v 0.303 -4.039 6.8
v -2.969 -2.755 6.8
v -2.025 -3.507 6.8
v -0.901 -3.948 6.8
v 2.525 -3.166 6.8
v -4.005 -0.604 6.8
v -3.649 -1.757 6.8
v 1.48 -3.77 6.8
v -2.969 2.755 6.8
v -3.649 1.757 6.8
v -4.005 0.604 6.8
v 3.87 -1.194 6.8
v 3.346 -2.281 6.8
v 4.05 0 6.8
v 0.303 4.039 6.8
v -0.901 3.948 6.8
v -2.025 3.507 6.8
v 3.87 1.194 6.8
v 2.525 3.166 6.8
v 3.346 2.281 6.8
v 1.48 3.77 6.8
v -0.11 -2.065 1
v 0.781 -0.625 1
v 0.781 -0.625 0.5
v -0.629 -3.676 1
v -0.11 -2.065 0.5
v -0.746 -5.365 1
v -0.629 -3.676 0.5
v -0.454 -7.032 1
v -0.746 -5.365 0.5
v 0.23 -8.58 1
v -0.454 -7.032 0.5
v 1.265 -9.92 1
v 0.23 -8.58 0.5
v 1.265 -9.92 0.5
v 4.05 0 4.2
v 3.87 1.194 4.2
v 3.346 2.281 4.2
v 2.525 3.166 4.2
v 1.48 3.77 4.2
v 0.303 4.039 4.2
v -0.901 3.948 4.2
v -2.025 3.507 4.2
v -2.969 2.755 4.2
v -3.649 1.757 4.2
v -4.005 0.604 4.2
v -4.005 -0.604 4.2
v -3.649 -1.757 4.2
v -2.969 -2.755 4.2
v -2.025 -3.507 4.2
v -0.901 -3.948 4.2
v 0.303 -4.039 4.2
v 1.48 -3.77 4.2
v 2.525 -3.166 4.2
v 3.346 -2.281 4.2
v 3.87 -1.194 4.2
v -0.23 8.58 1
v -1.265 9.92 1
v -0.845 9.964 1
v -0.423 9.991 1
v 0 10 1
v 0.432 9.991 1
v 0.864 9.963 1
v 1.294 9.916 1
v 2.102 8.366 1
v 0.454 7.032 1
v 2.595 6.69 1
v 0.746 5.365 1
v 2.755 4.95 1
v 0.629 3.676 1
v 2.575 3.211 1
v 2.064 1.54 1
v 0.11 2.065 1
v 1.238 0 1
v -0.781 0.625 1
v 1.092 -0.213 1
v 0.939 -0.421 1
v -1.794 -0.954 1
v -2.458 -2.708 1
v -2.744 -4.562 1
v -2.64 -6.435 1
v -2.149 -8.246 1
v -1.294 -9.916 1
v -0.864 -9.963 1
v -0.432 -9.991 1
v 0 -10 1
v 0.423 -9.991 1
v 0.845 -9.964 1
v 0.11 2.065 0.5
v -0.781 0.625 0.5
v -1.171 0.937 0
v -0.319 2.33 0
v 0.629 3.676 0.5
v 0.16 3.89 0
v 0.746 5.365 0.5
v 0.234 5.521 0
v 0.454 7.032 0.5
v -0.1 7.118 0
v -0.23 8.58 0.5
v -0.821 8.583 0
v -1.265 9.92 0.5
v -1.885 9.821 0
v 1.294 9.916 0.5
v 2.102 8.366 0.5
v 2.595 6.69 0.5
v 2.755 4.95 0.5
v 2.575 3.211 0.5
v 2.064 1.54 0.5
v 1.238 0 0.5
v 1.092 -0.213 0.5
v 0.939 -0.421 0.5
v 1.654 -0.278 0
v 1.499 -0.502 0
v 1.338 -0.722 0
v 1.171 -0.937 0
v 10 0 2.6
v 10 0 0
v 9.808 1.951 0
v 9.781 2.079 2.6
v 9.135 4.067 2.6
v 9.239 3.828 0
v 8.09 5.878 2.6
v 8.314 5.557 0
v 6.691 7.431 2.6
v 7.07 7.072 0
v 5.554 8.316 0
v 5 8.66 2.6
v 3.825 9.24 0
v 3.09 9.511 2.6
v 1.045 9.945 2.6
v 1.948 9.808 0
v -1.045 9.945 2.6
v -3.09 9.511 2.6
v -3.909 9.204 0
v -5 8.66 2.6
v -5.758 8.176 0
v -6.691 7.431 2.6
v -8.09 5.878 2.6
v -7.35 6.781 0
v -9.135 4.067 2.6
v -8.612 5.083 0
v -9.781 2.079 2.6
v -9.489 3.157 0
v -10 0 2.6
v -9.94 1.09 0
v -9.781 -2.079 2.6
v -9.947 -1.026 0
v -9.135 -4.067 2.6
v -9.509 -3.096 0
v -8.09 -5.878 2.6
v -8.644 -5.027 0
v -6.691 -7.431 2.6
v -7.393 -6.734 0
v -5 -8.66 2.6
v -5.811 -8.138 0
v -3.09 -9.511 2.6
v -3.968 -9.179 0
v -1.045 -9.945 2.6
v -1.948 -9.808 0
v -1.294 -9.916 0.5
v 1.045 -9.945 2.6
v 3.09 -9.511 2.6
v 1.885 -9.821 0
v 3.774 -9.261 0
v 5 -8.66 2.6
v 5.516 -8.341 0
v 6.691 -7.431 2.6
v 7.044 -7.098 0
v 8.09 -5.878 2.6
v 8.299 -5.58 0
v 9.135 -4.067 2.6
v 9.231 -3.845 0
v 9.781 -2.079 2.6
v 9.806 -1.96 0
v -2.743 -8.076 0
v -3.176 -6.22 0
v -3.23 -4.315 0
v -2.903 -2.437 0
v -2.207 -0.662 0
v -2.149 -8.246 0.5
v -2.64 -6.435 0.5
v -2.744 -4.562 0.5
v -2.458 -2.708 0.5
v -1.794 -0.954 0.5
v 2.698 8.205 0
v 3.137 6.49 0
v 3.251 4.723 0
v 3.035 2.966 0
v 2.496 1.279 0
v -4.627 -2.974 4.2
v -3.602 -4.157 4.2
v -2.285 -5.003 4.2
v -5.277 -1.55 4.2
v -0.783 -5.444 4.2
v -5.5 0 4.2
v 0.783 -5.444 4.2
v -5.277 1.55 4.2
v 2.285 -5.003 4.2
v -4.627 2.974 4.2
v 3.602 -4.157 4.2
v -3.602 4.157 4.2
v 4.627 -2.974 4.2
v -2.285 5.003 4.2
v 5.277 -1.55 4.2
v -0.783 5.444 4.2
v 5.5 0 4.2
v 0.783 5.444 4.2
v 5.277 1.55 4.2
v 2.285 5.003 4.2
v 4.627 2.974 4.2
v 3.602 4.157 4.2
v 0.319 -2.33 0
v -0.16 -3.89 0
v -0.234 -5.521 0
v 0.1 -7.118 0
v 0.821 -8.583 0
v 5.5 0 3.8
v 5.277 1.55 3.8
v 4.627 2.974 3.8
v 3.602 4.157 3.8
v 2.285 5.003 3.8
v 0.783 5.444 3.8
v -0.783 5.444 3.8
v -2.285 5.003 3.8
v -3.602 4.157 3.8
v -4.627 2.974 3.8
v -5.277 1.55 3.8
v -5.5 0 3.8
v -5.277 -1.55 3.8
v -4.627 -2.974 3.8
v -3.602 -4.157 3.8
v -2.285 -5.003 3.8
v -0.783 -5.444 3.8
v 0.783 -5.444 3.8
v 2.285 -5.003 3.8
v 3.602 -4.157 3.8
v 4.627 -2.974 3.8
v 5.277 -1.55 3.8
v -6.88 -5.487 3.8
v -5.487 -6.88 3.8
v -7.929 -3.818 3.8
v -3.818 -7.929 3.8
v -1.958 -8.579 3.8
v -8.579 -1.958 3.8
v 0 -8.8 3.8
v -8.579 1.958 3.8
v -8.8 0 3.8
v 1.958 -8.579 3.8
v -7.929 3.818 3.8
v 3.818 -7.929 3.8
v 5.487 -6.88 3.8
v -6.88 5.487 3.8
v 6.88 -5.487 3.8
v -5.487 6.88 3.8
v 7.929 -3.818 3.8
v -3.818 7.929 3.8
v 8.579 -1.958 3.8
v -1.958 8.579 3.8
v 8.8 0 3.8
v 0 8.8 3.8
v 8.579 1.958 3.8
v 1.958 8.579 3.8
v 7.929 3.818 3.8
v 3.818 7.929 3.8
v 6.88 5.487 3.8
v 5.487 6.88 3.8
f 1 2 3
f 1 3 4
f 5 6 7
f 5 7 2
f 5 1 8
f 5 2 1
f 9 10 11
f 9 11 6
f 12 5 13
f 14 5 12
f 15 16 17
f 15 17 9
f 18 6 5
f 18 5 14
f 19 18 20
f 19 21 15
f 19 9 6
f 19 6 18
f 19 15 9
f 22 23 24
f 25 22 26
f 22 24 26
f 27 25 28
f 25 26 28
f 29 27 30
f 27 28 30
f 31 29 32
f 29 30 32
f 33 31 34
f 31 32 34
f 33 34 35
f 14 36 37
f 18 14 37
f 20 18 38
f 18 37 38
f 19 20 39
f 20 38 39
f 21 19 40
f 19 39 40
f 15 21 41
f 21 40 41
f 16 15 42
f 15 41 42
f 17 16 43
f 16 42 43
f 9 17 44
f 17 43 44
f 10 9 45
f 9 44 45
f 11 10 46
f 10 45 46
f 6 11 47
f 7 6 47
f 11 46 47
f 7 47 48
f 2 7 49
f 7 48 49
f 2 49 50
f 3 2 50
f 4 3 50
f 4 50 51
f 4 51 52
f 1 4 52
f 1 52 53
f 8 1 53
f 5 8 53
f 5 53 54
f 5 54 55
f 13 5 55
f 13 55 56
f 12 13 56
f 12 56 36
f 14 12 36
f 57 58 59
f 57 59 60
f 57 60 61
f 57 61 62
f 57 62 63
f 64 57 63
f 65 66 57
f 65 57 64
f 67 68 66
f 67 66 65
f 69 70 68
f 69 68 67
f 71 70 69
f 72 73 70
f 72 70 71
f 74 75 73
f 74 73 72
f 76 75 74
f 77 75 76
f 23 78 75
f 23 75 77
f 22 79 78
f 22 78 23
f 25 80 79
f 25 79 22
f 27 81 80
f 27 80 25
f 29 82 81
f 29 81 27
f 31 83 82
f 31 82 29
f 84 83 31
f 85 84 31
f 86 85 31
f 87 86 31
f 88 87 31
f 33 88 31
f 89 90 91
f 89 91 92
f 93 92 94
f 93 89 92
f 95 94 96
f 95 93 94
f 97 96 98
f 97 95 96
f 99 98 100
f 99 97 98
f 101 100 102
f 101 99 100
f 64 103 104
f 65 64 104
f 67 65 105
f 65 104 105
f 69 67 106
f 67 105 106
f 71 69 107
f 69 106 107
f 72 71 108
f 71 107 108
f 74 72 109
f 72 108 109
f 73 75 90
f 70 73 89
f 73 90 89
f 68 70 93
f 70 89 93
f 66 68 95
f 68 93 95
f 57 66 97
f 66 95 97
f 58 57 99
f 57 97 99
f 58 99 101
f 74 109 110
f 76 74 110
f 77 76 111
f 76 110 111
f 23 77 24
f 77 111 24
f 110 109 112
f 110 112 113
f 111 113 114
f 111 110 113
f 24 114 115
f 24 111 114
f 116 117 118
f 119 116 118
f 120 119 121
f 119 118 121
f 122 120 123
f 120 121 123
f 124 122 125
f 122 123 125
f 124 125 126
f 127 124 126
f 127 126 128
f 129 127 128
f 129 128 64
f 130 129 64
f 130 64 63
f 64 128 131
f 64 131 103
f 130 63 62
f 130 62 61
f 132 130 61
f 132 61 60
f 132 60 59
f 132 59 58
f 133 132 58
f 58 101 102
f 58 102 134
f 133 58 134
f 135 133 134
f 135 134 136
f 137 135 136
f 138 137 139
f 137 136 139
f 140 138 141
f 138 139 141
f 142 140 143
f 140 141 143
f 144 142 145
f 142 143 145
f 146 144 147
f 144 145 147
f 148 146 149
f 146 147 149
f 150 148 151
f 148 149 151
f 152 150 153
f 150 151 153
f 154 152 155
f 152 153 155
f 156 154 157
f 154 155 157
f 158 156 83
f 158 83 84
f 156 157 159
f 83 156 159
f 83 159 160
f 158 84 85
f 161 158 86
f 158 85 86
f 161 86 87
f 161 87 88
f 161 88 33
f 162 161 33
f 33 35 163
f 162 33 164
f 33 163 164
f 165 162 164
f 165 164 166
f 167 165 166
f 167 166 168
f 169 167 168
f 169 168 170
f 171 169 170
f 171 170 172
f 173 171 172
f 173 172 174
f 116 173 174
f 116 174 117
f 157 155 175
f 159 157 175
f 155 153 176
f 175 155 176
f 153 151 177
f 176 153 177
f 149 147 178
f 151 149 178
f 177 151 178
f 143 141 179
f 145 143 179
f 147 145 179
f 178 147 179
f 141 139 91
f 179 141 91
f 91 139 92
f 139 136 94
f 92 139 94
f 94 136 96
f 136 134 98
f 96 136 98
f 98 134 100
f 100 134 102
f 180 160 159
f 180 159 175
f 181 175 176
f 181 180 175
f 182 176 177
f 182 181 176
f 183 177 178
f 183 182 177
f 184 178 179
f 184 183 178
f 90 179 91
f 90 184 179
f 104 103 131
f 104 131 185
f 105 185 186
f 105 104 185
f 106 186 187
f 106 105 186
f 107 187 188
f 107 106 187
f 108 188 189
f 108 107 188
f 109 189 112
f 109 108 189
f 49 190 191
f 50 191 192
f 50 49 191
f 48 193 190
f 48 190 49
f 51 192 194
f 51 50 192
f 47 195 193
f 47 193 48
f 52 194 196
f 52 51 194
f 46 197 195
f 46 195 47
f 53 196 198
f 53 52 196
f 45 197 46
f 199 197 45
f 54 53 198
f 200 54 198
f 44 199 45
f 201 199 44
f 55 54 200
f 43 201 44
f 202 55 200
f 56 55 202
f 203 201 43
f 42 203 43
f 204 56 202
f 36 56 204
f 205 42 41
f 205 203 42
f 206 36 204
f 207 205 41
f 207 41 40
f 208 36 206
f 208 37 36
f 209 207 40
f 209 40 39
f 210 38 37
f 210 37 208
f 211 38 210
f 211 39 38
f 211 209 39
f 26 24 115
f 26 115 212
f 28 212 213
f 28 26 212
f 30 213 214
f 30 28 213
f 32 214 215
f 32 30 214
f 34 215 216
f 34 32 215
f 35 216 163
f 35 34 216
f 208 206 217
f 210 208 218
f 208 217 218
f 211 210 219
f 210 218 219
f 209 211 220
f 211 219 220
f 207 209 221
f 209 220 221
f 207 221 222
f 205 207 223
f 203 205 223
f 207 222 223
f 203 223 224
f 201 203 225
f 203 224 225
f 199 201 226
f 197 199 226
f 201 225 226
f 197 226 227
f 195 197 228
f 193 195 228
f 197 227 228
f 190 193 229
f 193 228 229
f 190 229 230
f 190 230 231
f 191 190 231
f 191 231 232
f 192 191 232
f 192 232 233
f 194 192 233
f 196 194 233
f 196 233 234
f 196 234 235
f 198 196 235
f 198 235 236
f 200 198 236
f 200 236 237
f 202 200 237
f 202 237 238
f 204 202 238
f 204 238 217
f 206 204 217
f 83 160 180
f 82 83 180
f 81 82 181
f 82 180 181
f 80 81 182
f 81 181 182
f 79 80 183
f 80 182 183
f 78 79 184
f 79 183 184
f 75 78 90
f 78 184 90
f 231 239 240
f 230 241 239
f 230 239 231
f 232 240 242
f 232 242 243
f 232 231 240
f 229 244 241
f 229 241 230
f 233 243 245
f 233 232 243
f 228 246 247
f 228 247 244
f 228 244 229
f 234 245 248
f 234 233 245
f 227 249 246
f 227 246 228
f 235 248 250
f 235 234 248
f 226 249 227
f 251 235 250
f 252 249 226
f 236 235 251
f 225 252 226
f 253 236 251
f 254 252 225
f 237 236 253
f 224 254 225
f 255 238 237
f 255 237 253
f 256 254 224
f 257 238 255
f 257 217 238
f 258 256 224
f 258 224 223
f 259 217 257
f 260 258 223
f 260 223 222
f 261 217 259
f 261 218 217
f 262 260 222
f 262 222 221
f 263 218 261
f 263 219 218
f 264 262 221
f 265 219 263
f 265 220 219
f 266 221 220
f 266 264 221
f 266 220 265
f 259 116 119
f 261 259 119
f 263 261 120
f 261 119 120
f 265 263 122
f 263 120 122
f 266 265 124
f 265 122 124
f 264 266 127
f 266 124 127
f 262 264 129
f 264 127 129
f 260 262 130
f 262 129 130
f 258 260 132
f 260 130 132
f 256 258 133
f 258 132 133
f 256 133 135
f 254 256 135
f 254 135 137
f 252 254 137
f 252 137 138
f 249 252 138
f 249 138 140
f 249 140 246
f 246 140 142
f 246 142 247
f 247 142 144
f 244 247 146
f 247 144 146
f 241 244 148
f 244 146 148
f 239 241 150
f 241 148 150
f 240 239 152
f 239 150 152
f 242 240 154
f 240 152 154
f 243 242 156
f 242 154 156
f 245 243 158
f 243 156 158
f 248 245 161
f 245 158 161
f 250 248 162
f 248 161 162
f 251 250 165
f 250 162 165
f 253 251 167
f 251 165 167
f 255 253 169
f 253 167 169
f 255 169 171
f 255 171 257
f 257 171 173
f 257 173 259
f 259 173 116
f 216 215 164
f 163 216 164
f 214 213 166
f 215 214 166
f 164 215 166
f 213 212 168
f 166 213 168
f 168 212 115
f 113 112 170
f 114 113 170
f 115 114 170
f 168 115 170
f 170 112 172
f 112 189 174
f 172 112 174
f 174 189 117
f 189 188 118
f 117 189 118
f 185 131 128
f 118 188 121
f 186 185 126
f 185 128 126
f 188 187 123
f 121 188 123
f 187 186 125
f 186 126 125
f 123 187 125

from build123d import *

# Parameters (mm, degrees)
F0_R     = 10
F0_R_2   = 5.5
F0_R_3   = 4.05
F1_DEPTH = 3.8
F2_DEPTH = 6.8
F3_SIZE  = 1.2
F4_DEPTH = 4.2
F6_DEPTH = 1
F7_SIZE2 = 0.5
F7_SIZE  = 0.5


with BuildPart() as f1:
    # F0 (on Top) → F1 (new body)
    with BuildSketch(Plane.XY):
        Circle(F0_R)
        Circle(F0_R_2, mode=Mode.SUBTRACT)
        Circle(F0_R_3)
        Circle(F0_R_2)
        Circle(F0_R_3, mode=Mode.SUBTRACT)
    extrude(amount=F1_DEPTH)

    # F0 (on Top) → F2 (join)
    with BuildSketch(Plane.XY):
        Circle(F0_R_3)
    extrude(amount=F2_DEPTH)

    # F3
    f3_edges = [f1.edges().sort_by_distance(p)[0] for p in [
        (-10, 0, 3.8),
    ]]
    chamfer(f3_edges, length=F3_SIZE)

    # F0 (on Top) → F4 (join)
    with BuildSketch(Plane.XY):
        Circle(F0_R_2)
        Circle(F0_R_3, mode=Mode.SUBTRACT)
    extrude(amount=F4_DEPTH)

    # F5 (on face) → F6 (cut)
    with BuildSketch(Plane(origin=(0, 0, 0), x_dir=(1, 0, 0), z_dir=(0, 0, -1))):
        with BuildLine():
            ThreePointArc((0, 0), (-1.755002, 5), (0, 10))
            ThreePointArc((0, 10), (-0.648262, 9.978966), (-1.293797, 9.915951))
            ThreePointArc((-1.293797, 9.915951), (-2.744355, 4.562366), (-0.780625, -0.625))
            ThreePointArc((-0.780625, -0.625), (0.745504, -5.364534), (-1.265312, -9.919626))
            ThreePointArc((-1.265312, -9.919626), (-0.633931, -9.979886), (0, -10))
            ThreePointArc((0, -10), (1.755002, -5), (0, 0))
        make_face()
        with BuildLine():
            ThreePointArc((1.265312, 9.919626), (0.633931, 9.979886), (0, 10))
            ThreePointArc((0, 10), (-1.755002, 5), (0, 0))
            Line((0, 0), (1.238317, 0))
            ThreePointArc((1.238317, 0), (1.016198, 0.317427), (0.780625, 0.625))
            ThreePointArc((0.780625, 0.625), (-0.745504, 5.364534), (1.265312, 9.919626))
        make_face()
        with BuildLine():
            Line((1.238317, 0), (0, 0))
            ThreePointArc((0, 0), (1.755002, -5), (0, -10))
            ThreePointArc((0, -10), (0.648262, -9.978966), (1.293797, -9.915951))
            ThreePointArc((1.293797, -9.915951), (2.754861, -4.949646), (1.238317, 0))
        make_face()
    extrude(amount=-F6_DEPTH, mode=Mode.SUBTRACT)

    # F7
    f7_edges = [f1.edges().sort_by_distance(p)[0] for p in [
        (-2.744355, -4.562366, 0),
        (0.745504, 5.364534, 0),
        (2.744355, 4.562366, 0),
        (-0.745504, -5.364534, 0),
    ]]
    chamfer(f7_edges, length=F7_SIZE, length2=F7_SIZE2)


solid = f1.part
